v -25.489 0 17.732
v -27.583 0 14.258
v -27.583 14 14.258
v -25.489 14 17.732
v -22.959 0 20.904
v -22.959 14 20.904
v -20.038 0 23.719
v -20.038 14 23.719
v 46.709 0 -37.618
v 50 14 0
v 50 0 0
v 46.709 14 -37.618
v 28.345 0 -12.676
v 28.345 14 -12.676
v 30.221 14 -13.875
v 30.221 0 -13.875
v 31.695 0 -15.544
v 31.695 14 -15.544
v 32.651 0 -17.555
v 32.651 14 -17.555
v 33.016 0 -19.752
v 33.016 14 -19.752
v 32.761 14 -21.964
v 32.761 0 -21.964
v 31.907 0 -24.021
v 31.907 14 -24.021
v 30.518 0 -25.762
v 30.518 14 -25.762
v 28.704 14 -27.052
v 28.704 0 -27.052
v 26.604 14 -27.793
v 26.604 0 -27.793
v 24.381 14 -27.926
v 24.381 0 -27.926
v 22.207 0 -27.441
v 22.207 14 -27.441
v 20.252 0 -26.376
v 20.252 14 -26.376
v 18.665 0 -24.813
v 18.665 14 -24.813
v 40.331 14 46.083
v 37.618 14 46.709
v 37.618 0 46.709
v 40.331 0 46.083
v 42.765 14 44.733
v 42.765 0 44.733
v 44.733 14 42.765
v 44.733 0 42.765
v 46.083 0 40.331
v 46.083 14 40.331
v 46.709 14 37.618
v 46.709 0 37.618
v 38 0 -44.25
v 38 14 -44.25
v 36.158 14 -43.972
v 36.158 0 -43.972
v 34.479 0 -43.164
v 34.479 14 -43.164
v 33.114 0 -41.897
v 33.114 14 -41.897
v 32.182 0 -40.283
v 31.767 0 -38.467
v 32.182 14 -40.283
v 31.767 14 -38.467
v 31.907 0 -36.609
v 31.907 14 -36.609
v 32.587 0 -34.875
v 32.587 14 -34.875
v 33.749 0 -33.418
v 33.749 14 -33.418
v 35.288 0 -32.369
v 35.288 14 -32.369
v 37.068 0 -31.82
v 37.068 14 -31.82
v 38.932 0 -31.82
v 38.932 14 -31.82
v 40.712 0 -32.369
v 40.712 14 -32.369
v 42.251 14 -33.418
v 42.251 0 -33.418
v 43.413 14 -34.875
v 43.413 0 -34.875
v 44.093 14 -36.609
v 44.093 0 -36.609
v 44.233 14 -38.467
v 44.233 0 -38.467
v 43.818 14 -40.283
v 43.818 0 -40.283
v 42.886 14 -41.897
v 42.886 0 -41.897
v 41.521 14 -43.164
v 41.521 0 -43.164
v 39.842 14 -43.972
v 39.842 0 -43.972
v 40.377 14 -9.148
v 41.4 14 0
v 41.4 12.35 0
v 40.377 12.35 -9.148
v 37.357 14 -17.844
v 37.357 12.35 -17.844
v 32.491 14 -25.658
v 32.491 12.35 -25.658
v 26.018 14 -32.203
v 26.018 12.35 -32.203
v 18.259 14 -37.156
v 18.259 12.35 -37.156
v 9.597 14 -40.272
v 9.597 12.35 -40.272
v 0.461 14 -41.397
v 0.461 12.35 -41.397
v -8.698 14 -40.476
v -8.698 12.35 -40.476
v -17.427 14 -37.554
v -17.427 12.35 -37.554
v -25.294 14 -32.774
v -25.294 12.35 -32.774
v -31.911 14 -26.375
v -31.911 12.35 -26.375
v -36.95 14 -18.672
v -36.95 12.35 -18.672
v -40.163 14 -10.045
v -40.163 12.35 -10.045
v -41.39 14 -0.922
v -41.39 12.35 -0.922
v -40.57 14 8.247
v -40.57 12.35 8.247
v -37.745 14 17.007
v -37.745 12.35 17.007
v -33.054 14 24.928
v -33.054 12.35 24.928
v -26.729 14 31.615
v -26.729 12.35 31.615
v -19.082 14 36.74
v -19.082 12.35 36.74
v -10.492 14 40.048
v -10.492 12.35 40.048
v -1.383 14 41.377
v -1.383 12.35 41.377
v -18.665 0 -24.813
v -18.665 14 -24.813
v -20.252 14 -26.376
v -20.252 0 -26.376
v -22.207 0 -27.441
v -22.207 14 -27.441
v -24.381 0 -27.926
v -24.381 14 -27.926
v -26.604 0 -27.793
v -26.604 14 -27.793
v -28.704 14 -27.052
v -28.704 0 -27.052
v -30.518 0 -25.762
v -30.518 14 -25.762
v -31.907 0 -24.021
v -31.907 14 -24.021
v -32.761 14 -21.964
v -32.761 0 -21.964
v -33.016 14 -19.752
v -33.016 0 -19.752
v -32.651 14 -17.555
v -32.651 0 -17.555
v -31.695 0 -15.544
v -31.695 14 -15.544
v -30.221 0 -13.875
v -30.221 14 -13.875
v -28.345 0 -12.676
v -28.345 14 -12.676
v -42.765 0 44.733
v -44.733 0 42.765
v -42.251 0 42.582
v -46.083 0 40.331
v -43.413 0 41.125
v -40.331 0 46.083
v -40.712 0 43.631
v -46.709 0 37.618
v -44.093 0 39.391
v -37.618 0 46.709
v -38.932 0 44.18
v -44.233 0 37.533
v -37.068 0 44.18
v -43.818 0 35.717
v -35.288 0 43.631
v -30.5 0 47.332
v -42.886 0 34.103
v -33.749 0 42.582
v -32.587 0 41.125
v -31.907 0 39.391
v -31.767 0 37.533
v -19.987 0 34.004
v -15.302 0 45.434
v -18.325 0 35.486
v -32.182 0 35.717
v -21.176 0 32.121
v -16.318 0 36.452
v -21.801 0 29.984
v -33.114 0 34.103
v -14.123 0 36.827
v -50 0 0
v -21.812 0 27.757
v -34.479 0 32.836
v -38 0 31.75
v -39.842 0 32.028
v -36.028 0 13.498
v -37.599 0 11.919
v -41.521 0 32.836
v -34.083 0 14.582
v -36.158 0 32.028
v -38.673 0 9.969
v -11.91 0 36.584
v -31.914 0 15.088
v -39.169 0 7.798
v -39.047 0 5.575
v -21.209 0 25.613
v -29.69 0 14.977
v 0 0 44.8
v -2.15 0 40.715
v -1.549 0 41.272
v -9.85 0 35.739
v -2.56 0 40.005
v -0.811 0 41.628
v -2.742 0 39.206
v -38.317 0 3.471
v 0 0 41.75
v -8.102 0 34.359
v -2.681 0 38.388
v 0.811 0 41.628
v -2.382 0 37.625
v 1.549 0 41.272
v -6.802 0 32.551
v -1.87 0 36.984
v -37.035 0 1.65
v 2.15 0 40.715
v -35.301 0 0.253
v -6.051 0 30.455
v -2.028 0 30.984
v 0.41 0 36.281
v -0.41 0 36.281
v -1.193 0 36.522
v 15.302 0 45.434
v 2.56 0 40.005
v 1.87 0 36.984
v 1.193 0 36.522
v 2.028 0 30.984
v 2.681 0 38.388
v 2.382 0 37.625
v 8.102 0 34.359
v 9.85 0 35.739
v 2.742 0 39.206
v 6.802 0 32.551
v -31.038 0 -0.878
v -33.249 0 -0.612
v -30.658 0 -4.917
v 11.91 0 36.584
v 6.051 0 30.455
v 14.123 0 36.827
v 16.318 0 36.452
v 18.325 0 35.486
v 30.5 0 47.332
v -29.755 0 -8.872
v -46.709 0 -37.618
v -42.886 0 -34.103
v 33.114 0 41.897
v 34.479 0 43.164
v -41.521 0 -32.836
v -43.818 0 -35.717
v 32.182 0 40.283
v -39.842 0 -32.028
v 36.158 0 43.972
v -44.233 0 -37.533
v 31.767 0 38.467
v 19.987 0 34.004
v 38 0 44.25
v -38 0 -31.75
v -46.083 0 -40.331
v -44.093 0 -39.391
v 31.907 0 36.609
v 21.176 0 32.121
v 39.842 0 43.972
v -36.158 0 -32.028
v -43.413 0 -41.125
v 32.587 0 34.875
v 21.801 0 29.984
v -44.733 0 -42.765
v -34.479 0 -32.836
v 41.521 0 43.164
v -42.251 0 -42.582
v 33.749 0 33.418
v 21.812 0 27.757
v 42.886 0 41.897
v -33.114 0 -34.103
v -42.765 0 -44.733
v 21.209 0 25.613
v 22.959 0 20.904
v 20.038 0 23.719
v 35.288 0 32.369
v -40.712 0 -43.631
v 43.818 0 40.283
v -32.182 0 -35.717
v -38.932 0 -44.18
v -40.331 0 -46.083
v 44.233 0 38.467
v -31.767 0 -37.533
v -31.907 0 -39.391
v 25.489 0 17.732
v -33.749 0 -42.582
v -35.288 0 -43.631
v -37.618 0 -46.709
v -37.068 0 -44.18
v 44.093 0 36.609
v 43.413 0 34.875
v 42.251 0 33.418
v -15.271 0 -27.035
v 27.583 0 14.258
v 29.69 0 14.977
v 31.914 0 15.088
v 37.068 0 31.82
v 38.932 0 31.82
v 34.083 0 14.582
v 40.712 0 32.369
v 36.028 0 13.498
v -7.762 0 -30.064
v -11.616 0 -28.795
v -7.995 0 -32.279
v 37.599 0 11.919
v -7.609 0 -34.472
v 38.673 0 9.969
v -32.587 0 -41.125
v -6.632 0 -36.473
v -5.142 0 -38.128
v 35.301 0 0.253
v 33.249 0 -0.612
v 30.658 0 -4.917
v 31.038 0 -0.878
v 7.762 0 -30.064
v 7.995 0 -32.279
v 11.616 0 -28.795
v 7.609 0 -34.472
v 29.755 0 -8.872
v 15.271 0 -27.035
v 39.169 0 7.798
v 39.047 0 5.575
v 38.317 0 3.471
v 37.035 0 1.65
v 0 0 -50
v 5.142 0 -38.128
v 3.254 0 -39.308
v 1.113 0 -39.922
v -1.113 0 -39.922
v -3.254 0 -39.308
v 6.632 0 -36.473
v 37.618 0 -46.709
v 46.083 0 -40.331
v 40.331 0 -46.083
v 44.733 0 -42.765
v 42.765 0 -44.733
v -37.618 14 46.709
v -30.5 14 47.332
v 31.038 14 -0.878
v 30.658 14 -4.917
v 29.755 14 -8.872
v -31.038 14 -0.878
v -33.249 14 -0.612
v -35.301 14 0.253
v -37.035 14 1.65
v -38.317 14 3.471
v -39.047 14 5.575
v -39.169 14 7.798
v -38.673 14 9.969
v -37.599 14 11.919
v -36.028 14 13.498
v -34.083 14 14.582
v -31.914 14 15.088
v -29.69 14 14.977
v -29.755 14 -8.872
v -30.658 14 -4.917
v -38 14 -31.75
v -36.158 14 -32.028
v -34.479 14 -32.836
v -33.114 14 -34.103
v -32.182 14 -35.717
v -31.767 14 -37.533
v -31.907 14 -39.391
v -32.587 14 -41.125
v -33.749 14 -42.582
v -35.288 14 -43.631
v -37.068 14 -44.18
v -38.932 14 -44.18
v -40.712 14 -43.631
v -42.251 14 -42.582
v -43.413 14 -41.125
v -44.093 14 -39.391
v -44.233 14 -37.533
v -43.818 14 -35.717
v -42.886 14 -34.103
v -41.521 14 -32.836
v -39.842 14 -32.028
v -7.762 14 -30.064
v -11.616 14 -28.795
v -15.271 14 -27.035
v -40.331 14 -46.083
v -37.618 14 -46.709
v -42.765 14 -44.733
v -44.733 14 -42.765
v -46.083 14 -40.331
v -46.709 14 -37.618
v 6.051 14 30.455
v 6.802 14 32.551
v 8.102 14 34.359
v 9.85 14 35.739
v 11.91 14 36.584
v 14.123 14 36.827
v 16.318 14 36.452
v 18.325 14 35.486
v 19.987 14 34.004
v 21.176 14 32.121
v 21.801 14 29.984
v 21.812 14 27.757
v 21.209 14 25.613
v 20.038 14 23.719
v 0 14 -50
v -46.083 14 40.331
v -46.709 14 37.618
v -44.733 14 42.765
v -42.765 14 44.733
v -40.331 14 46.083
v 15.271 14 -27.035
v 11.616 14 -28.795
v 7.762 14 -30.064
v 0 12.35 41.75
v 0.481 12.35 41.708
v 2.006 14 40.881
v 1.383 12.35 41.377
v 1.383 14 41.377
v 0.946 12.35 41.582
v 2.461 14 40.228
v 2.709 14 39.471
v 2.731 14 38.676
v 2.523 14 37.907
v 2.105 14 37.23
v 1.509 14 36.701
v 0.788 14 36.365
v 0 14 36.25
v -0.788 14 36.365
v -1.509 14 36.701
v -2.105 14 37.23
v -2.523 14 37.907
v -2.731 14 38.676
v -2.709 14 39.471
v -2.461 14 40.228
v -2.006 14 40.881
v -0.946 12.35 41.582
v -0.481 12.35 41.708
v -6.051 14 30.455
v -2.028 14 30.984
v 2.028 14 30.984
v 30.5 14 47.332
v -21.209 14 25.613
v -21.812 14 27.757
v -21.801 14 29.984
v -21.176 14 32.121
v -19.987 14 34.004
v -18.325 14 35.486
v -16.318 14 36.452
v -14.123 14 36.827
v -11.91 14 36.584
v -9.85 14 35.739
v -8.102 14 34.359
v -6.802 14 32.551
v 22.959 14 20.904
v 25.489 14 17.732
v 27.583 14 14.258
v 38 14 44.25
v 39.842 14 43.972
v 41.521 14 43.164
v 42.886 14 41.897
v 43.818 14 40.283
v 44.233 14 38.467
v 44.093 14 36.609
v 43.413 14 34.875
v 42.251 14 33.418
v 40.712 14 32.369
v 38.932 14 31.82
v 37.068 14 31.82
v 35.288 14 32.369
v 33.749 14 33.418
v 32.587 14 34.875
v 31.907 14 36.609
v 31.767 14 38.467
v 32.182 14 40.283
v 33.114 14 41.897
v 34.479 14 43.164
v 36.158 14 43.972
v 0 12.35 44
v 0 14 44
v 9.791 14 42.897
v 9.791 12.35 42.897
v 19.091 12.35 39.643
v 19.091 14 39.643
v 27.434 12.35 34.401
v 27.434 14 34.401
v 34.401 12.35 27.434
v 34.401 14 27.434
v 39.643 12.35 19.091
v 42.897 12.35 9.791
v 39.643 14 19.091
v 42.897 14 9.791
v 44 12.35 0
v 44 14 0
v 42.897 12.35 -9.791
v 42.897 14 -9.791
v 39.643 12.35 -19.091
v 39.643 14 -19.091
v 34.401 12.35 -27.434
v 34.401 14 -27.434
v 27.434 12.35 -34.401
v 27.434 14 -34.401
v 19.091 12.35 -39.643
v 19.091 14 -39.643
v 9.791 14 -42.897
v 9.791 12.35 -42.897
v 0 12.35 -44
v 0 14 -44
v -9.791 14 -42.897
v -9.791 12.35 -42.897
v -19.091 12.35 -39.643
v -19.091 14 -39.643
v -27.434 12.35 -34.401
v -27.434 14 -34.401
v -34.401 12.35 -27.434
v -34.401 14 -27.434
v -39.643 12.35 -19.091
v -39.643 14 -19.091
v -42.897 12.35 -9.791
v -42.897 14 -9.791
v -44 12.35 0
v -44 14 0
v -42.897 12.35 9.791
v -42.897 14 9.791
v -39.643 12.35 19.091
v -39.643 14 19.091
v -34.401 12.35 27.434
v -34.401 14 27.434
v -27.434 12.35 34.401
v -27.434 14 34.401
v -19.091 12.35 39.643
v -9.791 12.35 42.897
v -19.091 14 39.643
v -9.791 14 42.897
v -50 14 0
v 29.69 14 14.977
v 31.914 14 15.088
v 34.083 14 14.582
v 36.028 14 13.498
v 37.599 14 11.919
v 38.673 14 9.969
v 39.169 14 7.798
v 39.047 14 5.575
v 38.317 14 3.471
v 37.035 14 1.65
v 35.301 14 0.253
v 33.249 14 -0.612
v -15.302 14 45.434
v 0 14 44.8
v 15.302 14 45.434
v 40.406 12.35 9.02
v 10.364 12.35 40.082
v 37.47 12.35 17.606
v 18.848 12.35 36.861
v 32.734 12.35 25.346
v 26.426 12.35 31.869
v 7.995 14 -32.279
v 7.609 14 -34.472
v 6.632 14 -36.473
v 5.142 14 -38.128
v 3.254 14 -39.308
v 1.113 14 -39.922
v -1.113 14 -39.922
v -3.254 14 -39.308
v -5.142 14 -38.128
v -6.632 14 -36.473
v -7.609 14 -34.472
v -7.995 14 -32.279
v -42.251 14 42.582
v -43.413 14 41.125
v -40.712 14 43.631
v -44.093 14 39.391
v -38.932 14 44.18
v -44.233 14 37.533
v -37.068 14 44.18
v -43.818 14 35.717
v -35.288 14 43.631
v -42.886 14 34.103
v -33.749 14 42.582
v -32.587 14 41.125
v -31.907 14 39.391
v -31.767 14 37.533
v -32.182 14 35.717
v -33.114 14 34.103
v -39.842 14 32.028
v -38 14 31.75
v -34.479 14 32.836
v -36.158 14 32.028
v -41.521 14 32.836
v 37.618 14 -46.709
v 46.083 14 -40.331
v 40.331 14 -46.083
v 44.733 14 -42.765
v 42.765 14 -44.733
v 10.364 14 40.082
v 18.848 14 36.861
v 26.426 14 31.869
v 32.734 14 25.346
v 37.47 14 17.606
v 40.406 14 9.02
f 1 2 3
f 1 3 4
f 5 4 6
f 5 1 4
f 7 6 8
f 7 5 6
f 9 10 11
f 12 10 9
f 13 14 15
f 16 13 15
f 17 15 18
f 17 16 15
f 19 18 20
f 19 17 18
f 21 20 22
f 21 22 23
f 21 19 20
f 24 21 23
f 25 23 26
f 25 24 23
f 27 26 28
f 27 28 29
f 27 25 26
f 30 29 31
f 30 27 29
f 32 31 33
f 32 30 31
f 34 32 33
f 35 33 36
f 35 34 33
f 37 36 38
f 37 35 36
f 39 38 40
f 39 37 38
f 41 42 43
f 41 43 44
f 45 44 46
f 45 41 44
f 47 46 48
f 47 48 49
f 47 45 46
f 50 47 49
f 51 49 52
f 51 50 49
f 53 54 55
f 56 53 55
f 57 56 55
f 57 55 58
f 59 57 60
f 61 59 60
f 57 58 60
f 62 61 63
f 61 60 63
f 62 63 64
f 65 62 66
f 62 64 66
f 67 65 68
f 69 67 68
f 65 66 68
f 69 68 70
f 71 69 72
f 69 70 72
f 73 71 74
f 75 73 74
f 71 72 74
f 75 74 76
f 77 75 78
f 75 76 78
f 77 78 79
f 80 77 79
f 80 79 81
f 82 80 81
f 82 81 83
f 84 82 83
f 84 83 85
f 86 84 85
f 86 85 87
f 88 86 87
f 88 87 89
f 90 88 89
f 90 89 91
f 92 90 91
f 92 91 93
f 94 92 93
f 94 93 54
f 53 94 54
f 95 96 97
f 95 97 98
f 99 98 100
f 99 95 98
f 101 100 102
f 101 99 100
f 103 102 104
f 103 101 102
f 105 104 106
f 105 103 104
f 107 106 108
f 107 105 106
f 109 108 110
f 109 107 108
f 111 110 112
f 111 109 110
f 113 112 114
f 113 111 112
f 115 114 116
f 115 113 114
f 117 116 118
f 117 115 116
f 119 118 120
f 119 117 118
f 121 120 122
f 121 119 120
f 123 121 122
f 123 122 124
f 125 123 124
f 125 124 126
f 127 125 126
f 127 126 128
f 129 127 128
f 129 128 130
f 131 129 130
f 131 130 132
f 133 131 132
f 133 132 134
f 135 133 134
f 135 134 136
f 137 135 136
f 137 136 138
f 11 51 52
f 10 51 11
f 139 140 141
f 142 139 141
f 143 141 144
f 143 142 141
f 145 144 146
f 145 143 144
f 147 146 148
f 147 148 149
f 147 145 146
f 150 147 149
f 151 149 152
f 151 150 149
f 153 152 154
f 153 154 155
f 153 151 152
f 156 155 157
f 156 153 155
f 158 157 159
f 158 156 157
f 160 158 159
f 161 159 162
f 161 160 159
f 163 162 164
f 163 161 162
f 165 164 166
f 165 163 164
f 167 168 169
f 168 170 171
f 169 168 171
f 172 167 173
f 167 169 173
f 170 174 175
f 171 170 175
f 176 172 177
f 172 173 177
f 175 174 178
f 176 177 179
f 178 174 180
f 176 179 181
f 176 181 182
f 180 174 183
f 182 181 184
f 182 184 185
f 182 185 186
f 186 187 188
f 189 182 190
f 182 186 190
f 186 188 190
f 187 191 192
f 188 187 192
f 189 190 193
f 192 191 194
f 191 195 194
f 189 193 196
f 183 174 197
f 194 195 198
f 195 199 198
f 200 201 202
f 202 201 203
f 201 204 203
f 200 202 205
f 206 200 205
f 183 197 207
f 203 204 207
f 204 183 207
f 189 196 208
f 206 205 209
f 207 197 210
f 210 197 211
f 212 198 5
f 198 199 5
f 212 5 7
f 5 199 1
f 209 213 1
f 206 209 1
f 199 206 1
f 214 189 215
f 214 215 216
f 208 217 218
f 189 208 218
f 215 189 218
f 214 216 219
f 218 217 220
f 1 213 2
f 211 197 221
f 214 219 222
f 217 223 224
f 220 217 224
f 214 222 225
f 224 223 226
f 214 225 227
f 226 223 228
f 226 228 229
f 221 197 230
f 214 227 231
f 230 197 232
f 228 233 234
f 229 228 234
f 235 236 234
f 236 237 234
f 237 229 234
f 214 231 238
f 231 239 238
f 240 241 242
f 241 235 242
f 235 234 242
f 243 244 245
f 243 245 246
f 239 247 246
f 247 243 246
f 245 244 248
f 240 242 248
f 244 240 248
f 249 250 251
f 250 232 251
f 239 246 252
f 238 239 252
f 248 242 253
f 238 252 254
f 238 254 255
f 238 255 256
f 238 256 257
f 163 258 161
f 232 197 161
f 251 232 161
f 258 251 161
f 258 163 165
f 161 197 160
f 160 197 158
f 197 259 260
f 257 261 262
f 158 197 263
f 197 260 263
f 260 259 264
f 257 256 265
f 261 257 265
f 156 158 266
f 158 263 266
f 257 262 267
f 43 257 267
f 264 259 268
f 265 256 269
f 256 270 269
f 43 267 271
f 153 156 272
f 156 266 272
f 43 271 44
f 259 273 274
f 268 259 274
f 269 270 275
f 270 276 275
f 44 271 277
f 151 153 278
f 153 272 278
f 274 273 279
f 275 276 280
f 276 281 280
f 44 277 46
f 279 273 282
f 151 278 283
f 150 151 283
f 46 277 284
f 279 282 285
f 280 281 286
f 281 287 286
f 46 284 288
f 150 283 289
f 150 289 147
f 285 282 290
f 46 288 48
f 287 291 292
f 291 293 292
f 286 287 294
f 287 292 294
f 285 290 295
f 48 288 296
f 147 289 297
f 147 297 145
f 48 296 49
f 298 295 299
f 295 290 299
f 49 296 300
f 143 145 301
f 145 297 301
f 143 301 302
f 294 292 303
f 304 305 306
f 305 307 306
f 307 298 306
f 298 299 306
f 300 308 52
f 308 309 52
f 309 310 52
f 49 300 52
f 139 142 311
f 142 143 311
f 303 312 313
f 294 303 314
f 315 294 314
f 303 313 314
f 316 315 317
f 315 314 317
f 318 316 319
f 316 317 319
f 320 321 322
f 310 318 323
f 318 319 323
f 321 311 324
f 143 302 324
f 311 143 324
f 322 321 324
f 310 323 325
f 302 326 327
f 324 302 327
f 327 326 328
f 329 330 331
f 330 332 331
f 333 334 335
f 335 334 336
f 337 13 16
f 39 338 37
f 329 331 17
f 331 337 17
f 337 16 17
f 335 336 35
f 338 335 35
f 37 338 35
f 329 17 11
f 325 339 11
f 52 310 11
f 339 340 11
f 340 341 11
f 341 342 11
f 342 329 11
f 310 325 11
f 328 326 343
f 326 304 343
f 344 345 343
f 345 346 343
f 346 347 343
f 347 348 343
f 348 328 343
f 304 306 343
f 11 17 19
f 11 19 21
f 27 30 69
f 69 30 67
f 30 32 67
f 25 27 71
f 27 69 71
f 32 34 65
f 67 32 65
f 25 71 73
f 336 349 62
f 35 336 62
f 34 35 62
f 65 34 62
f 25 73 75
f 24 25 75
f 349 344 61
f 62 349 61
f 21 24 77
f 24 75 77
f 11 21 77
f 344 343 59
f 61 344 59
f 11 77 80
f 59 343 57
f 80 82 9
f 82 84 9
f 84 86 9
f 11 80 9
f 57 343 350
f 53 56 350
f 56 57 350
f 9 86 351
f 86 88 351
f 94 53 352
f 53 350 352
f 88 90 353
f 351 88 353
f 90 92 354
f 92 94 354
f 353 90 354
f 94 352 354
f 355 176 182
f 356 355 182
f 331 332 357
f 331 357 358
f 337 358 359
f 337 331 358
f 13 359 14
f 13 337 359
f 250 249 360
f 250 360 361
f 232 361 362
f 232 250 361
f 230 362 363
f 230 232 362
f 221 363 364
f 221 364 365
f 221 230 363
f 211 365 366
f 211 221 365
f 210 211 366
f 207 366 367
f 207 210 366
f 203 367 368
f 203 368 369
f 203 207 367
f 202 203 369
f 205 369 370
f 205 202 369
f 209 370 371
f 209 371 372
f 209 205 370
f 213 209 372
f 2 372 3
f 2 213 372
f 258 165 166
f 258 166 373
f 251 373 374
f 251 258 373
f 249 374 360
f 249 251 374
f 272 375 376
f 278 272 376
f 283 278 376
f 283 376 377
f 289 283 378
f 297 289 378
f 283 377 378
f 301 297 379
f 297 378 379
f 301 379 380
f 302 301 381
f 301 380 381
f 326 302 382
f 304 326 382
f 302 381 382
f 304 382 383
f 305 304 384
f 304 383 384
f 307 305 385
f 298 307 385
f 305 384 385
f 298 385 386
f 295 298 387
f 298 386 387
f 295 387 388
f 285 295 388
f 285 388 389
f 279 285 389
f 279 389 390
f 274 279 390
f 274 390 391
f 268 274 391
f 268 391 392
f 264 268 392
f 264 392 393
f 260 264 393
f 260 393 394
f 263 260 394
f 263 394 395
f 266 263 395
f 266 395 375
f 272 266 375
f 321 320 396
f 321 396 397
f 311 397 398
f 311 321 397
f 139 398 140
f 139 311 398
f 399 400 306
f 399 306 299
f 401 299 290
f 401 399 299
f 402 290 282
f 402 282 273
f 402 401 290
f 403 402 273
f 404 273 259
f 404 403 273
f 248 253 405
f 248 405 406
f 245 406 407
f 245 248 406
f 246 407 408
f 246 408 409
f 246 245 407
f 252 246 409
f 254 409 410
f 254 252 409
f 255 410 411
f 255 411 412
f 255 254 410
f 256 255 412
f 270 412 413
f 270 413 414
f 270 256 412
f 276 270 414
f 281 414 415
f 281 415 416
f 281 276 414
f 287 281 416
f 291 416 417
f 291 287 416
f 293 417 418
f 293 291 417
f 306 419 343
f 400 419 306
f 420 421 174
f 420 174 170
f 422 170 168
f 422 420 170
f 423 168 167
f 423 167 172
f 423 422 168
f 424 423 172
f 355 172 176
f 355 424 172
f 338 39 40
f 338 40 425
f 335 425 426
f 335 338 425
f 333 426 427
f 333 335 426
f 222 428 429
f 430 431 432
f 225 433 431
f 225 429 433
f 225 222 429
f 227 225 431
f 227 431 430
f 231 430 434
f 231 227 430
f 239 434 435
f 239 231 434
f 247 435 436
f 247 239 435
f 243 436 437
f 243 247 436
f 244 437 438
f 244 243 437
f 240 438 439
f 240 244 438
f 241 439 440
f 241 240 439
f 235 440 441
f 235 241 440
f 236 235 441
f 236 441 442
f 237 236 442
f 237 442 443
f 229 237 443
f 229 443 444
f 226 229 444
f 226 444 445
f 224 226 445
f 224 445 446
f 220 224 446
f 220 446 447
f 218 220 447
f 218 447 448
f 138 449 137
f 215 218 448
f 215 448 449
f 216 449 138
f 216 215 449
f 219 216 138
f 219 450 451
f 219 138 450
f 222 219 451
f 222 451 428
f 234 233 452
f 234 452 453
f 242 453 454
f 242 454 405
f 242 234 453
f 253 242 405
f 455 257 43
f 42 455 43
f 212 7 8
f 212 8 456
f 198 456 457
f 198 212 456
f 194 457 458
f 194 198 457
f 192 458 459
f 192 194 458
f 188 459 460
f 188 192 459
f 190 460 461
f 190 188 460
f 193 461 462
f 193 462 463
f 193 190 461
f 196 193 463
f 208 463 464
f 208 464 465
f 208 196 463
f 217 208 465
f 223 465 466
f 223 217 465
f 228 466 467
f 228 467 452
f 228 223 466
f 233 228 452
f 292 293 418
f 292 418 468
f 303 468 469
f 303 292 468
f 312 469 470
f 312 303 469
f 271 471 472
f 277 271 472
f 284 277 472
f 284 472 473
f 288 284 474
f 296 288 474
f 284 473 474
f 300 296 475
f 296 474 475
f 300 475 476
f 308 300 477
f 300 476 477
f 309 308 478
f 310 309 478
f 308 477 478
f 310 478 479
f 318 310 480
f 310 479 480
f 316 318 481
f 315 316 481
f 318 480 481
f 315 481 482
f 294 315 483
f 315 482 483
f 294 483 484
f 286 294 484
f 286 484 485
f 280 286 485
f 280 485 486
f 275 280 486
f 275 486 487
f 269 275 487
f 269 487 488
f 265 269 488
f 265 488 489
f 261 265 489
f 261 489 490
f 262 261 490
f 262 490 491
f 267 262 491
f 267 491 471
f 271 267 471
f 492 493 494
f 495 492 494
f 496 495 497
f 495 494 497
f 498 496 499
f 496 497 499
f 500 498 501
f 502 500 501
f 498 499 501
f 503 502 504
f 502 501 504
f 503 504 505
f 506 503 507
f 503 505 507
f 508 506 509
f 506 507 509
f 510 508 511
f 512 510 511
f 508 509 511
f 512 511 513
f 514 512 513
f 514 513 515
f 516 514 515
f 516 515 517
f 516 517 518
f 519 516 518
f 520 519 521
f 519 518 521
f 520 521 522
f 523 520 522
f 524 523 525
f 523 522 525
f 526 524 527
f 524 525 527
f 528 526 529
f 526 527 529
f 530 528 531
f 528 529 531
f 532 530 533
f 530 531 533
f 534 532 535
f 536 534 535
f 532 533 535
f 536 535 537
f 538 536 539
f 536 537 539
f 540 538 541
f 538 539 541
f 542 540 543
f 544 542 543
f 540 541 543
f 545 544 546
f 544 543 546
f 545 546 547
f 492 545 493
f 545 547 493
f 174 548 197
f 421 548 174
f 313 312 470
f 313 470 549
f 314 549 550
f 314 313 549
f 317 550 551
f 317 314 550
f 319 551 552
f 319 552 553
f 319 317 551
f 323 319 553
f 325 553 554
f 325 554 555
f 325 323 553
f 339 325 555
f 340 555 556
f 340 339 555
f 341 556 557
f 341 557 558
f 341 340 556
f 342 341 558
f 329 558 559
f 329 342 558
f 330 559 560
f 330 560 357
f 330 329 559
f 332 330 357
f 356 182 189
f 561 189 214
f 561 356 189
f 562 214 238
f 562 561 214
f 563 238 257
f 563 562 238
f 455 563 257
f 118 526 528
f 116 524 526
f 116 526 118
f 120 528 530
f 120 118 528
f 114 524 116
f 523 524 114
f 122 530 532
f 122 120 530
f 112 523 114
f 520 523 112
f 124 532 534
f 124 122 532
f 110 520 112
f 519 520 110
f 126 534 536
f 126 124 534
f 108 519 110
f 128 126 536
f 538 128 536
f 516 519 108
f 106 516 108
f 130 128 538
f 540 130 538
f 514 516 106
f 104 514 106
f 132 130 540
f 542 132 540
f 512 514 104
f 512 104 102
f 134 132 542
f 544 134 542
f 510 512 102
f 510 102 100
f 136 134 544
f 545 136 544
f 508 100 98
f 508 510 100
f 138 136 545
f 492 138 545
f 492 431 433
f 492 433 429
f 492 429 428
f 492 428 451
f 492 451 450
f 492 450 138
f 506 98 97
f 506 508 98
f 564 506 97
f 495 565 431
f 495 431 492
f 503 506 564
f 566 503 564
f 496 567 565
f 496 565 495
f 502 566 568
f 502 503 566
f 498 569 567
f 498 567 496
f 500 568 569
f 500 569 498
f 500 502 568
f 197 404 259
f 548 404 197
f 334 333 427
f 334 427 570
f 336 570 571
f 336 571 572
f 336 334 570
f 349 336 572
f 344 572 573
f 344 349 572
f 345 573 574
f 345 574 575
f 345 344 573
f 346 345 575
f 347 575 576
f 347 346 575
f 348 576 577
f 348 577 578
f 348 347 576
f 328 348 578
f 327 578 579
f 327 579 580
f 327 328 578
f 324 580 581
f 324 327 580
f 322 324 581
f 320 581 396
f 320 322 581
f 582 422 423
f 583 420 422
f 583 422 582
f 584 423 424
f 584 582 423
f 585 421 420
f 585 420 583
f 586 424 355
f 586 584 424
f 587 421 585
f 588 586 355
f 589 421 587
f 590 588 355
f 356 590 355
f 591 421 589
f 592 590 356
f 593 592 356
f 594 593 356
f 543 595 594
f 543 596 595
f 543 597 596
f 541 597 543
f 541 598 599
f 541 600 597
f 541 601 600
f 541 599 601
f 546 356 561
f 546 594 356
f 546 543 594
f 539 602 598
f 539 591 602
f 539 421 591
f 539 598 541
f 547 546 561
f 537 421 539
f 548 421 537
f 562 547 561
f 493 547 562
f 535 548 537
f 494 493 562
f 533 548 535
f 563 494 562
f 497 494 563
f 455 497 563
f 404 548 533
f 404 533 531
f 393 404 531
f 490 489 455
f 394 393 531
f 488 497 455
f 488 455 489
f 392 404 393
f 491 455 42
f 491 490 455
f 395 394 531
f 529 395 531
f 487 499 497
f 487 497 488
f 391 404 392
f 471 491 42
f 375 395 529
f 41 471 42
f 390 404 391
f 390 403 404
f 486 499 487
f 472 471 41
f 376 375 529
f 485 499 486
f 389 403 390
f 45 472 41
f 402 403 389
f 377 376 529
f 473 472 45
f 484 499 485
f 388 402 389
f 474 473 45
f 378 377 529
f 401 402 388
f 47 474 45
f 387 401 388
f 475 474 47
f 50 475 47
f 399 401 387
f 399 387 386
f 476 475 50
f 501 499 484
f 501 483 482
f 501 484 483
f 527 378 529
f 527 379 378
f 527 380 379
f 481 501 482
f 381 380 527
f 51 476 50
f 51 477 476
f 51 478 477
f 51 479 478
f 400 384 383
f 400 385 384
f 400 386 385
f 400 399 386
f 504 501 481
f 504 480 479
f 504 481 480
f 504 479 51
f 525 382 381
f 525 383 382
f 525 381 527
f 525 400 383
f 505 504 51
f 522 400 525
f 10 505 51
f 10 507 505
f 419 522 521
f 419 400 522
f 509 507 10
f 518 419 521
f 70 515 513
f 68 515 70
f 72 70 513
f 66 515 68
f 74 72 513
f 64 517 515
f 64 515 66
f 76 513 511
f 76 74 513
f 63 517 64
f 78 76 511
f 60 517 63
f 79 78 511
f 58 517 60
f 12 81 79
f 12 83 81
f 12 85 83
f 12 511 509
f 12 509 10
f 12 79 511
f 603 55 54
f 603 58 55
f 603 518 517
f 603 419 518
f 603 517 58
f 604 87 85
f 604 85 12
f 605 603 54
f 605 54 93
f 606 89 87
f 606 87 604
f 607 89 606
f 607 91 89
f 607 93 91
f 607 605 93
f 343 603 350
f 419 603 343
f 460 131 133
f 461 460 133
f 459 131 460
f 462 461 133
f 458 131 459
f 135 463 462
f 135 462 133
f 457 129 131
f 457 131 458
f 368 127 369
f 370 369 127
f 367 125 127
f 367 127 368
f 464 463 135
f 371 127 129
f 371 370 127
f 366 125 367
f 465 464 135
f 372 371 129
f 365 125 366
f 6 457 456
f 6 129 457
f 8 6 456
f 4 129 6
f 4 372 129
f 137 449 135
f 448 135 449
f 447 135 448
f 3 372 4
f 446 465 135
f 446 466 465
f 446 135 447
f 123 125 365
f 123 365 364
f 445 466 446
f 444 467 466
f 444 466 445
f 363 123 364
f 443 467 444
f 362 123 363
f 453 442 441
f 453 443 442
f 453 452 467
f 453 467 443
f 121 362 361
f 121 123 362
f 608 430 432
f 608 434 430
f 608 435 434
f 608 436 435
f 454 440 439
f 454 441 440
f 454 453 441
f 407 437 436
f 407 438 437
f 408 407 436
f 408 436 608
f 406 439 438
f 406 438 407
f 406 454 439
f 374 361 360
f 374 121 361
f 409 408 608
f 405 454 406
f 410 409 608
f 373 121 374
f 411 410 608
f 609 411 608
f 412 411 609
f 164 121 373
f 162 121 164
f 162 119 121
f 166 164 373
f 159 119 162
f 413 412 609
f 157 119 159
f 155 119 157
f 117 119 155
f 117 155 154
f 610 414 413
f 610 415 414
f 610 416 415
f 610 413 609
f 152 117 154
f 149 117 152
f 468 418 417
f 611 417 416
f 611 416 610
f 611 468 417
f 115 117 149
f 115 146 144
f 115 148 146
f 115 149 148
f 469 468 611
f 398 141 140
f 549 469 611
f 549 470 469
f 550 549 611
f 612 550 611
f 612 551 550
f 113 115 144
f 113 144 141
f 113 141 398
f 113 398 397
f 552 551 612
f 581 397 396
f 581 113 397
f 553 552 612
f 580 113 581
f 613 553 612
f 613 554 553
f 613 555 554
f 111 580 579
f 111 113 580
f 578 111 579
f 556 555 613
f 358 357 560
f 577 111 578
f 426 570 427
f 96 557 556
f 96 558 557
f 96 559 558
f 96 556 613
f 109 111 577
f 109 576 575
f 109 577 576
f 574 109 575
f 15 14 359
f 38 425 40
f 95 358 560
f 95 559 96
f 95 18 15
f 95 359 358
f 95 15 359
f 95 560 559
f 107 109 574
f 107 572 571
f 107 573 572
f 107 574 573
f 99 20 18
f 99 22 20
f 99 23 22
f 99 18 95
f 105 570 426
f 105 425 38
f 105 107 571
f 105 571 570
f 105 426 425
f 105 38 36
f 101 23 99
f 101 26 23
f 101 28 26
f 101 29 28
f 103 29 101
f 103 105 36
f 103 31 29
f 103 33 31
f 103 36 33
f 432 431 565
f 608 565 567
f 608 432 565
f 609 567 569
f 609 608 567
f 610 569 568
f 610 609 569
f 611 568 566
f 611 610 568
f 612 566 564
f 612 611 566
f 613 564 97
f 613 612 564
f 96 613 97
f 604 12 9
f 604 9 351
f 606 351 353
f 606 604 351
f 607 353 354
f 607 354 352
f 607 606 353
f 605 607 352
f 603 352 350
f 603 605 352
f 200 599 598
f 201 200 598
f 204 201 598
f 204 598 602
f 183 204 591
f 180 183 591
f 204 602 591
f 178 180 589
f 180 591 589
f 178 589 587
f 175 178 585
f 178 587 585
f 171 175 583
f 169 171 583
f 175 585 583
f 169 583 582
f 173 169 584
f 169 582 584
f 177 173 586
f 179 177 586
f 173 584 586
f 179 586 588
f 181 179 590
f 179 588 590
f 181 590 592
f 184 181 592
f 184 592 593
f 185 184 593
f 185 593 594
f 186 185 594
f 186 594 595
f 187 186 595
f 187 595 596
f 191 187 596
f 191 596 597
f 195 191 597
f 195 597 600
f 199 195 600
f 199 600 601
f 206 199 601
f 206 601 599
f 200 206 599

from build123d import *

# Parameters (mm, degrees)
SKETCH1_W           = 100
SKETCH1_H           = 100
SKETCH1_R           = 2.75
BOSS_EXTRUDE1_DEPTH = 14
SKETCH2_R           = 44
SKETCH2_R_2         = 41.4
CUT_EXTRUDE1_DEPTH  = 1.65
SKETCH3_OUTSIDE_W   = 130.422
SKETCH3_OUTSIDE_H   = 130.422
SKETCH3_OUTSIDE_R   = 6.25
CUT_EXTRUDE2_DEPTH  = 73.083285164


with BuildPart() as part:
    # Sketch1 → Boss-Extrude1 (new body)
    with BuildSketch(Plane(origin=(0, 0, 0), x_dir=(1, 0, 0), z_dir=(0, 1, 0))):
        Rectangle(SKETCH1_W, SKETCH1_H)
        with Locations(Location((0, -39, 0), (0, 0, 270))):
            Circle(SKETCH1_R, mode=Mode.SUBTRACT)
        with BuildLine():
            ThreePointArc((7.762235325, 30.064101563), (0, 40), (-7.762235325, 30.064101562))
            ThreePointArc((-7.762235325, 30.064101562), (-13.4720901, 27.975083348), (-18.665386529, 24.813420678))
            ThreePointArc((-18.665386529, 24.813420678), (-31.273259299, 24.939592074), (-28.344735658, 12.675900775))
            ThreePointArc((-28.344735658, 12.675900775), (-30.271511673, 6.909274999), (-31.037591622, 0.877727921))
            ThreePointArc((-31.037591622, 0.877727921), (-38.997116487, -8.900837358), (-27.583071914, -14.257511837))
            ThreePointArc((-27.583071914, -14.257511837), (-24.275867531, -19.359358348), (-20.037857172, -23.718911863))
            ThreePointArc((-20.037857172, -23.718911863), (-17.355349565, -36.038754716), (-6.050792426, -30.454727236))
            ThreePointArc((-6.050792426, -30.454727236), (0, -31.05), (6.050792426, -30.454727236))
            ThreePointArc((6.050792426, -30.454727236), (17.355349565, -36.038754716), (20.037857172, -23.718911863))
            ThreePointArc((20.037857172, -23.718911863), (24.275867531, -19.359358348), (27.583071914, -14.257511837))
            ThreePointArc((27.583071914, -14.257511837), (38.997116487, -8.900837358), (31.037591622, 0.877727921))
            ThreePointArc((31.037591622, 0.877727921), (30.271511673, 6.909274999), (28.344735658, 12.675900775))
            ThreePointArc((28.344735658, 12.675900775), (31.273259299, 24.939592074), (18.665386529, 24.813420678))
            ThreePointArc((18.665386529, 24.813420678), (13.4720901, 27.975083348), (7.762235325, 30.064101563))
        make_face(mode=Mode.SUBTRACT)
    extrude(amount=BOSS_EXTRUDE1_DEPTH)

    # Sketch2 → Cut-Extrude1 (cut)
    with BuildSketch(Plane(origin=(0, 14, 0), x_dir=(1, 0, 0), z_dir=(0, 1, 0))):
        with Locations(Location((0, 0, 0), (0, 0, 270))):
            Circle(SKETCH2_R)
        Circle(SKETCH2_R_2, mode=Mode.SUBTRACT)
    extrude(amount=-CUT_EXTRUDE1_DEPTH, mode=Mode.SUBTRACT)

    # Sketch3 outside → Cut-Extrude2 (cut, through all)
    # profile 1 of 5: a face of its own
    with BuildSketch(Plane(origin=(0, 14, 0), x_dir=(1, 0, 0), z_dir=(0, 1, 0))):
        Rectangle(SKETCH3_OUTSIDE_W, SKETCH3_OUTSIDE_H)
        with BuildLine():
            Line((0, 50), (-37.618424742, 46.708814295))
            ThreePointArc((-37.618424742, 46.708814295), (-43.817935126, 43.817935126), (-46.708814295, 37.618424742))
            Line((-46.708814295, 37.618424742), (-50, 0))
            Line((-50, 0), (-46.708814295, -37.618424742))
            ThreePointArc((-46.708814295, -37.618424742), (-43.817935126, -43.817935126), (-37.618424742, -46.708814295))
            Line((-37.618424742, -46.708814295), (-30.5, -47.331595762))
            ThreePointArc((-30.5, -47.331595762), (0, -44.8), (30.5, -47.331595762))
            Line((30.5, -47.331595762), (37.618424742, -46.708814295))
            ThreePointArc((37.618424742, -46.708814295), (43.817935126, -43.817935126), (46.708814295, -37.618424742))
            Line((46.708814295, -37.618424742), (50, 0))
            Line((50, 0), (46.708814295, 37.618424742))
            ThreePointArc((46.708814295, 37.618424742), (43.817935126, 43.817935126), (37.618424742, 46.708814295))
            Line((37.618424742, 46.708814295), (0, 50))
        make_face(mode=Mode.SUBTRACT)
    # profile 2 of 5: a face of its own
    with BuildSketch(Plane(origin=(0, 14, 0), x_dir=(1, 0, 0), z_dir=(0, 1, 0))):
        with Locations(Location((-38, 38, 0), (0, 0, 270))):
            Circle(SKETCH3_OUTSIDE_R)
    # profile 3 of 5: a face of its own
    with BuildSketch(Plane(origin=(0, 14, 0), x_dir=(1, 0, 0), z_dir=(0, 1, 0))):
        with Locations(Location((38, 38, 0), (0, 0, 90))):
            Circle(SKETCH3_OUTSIDE_R)
    # profile 4 of 5: a face of its own
    with BuildSketch(Plane(origin=(0, 14, 0), x_dir=(1, 0, 0), z_dir=(0, 1, 0))):
        with Locations(Location((38, -38, 0), (0, 0, 270))):
            Circle(SKETCH3_OUTSIDE_R)
    # profile 5 of 5: a face of its own
    with BuildSketch(Plane(origin=(0, 14, 0), x_dir=(1, 0, 0), z_dir=(0, 1, 0))):
        with Locations(Location((-38, -38, 0), (0, 0, 90))):
            Circle(SKETCH3_OUTSIDE_R)
    extrude(amount=-CUT_EXTRUDE2_DEPTH, mode=Mode.SUBTRACT)


solid = part.part
